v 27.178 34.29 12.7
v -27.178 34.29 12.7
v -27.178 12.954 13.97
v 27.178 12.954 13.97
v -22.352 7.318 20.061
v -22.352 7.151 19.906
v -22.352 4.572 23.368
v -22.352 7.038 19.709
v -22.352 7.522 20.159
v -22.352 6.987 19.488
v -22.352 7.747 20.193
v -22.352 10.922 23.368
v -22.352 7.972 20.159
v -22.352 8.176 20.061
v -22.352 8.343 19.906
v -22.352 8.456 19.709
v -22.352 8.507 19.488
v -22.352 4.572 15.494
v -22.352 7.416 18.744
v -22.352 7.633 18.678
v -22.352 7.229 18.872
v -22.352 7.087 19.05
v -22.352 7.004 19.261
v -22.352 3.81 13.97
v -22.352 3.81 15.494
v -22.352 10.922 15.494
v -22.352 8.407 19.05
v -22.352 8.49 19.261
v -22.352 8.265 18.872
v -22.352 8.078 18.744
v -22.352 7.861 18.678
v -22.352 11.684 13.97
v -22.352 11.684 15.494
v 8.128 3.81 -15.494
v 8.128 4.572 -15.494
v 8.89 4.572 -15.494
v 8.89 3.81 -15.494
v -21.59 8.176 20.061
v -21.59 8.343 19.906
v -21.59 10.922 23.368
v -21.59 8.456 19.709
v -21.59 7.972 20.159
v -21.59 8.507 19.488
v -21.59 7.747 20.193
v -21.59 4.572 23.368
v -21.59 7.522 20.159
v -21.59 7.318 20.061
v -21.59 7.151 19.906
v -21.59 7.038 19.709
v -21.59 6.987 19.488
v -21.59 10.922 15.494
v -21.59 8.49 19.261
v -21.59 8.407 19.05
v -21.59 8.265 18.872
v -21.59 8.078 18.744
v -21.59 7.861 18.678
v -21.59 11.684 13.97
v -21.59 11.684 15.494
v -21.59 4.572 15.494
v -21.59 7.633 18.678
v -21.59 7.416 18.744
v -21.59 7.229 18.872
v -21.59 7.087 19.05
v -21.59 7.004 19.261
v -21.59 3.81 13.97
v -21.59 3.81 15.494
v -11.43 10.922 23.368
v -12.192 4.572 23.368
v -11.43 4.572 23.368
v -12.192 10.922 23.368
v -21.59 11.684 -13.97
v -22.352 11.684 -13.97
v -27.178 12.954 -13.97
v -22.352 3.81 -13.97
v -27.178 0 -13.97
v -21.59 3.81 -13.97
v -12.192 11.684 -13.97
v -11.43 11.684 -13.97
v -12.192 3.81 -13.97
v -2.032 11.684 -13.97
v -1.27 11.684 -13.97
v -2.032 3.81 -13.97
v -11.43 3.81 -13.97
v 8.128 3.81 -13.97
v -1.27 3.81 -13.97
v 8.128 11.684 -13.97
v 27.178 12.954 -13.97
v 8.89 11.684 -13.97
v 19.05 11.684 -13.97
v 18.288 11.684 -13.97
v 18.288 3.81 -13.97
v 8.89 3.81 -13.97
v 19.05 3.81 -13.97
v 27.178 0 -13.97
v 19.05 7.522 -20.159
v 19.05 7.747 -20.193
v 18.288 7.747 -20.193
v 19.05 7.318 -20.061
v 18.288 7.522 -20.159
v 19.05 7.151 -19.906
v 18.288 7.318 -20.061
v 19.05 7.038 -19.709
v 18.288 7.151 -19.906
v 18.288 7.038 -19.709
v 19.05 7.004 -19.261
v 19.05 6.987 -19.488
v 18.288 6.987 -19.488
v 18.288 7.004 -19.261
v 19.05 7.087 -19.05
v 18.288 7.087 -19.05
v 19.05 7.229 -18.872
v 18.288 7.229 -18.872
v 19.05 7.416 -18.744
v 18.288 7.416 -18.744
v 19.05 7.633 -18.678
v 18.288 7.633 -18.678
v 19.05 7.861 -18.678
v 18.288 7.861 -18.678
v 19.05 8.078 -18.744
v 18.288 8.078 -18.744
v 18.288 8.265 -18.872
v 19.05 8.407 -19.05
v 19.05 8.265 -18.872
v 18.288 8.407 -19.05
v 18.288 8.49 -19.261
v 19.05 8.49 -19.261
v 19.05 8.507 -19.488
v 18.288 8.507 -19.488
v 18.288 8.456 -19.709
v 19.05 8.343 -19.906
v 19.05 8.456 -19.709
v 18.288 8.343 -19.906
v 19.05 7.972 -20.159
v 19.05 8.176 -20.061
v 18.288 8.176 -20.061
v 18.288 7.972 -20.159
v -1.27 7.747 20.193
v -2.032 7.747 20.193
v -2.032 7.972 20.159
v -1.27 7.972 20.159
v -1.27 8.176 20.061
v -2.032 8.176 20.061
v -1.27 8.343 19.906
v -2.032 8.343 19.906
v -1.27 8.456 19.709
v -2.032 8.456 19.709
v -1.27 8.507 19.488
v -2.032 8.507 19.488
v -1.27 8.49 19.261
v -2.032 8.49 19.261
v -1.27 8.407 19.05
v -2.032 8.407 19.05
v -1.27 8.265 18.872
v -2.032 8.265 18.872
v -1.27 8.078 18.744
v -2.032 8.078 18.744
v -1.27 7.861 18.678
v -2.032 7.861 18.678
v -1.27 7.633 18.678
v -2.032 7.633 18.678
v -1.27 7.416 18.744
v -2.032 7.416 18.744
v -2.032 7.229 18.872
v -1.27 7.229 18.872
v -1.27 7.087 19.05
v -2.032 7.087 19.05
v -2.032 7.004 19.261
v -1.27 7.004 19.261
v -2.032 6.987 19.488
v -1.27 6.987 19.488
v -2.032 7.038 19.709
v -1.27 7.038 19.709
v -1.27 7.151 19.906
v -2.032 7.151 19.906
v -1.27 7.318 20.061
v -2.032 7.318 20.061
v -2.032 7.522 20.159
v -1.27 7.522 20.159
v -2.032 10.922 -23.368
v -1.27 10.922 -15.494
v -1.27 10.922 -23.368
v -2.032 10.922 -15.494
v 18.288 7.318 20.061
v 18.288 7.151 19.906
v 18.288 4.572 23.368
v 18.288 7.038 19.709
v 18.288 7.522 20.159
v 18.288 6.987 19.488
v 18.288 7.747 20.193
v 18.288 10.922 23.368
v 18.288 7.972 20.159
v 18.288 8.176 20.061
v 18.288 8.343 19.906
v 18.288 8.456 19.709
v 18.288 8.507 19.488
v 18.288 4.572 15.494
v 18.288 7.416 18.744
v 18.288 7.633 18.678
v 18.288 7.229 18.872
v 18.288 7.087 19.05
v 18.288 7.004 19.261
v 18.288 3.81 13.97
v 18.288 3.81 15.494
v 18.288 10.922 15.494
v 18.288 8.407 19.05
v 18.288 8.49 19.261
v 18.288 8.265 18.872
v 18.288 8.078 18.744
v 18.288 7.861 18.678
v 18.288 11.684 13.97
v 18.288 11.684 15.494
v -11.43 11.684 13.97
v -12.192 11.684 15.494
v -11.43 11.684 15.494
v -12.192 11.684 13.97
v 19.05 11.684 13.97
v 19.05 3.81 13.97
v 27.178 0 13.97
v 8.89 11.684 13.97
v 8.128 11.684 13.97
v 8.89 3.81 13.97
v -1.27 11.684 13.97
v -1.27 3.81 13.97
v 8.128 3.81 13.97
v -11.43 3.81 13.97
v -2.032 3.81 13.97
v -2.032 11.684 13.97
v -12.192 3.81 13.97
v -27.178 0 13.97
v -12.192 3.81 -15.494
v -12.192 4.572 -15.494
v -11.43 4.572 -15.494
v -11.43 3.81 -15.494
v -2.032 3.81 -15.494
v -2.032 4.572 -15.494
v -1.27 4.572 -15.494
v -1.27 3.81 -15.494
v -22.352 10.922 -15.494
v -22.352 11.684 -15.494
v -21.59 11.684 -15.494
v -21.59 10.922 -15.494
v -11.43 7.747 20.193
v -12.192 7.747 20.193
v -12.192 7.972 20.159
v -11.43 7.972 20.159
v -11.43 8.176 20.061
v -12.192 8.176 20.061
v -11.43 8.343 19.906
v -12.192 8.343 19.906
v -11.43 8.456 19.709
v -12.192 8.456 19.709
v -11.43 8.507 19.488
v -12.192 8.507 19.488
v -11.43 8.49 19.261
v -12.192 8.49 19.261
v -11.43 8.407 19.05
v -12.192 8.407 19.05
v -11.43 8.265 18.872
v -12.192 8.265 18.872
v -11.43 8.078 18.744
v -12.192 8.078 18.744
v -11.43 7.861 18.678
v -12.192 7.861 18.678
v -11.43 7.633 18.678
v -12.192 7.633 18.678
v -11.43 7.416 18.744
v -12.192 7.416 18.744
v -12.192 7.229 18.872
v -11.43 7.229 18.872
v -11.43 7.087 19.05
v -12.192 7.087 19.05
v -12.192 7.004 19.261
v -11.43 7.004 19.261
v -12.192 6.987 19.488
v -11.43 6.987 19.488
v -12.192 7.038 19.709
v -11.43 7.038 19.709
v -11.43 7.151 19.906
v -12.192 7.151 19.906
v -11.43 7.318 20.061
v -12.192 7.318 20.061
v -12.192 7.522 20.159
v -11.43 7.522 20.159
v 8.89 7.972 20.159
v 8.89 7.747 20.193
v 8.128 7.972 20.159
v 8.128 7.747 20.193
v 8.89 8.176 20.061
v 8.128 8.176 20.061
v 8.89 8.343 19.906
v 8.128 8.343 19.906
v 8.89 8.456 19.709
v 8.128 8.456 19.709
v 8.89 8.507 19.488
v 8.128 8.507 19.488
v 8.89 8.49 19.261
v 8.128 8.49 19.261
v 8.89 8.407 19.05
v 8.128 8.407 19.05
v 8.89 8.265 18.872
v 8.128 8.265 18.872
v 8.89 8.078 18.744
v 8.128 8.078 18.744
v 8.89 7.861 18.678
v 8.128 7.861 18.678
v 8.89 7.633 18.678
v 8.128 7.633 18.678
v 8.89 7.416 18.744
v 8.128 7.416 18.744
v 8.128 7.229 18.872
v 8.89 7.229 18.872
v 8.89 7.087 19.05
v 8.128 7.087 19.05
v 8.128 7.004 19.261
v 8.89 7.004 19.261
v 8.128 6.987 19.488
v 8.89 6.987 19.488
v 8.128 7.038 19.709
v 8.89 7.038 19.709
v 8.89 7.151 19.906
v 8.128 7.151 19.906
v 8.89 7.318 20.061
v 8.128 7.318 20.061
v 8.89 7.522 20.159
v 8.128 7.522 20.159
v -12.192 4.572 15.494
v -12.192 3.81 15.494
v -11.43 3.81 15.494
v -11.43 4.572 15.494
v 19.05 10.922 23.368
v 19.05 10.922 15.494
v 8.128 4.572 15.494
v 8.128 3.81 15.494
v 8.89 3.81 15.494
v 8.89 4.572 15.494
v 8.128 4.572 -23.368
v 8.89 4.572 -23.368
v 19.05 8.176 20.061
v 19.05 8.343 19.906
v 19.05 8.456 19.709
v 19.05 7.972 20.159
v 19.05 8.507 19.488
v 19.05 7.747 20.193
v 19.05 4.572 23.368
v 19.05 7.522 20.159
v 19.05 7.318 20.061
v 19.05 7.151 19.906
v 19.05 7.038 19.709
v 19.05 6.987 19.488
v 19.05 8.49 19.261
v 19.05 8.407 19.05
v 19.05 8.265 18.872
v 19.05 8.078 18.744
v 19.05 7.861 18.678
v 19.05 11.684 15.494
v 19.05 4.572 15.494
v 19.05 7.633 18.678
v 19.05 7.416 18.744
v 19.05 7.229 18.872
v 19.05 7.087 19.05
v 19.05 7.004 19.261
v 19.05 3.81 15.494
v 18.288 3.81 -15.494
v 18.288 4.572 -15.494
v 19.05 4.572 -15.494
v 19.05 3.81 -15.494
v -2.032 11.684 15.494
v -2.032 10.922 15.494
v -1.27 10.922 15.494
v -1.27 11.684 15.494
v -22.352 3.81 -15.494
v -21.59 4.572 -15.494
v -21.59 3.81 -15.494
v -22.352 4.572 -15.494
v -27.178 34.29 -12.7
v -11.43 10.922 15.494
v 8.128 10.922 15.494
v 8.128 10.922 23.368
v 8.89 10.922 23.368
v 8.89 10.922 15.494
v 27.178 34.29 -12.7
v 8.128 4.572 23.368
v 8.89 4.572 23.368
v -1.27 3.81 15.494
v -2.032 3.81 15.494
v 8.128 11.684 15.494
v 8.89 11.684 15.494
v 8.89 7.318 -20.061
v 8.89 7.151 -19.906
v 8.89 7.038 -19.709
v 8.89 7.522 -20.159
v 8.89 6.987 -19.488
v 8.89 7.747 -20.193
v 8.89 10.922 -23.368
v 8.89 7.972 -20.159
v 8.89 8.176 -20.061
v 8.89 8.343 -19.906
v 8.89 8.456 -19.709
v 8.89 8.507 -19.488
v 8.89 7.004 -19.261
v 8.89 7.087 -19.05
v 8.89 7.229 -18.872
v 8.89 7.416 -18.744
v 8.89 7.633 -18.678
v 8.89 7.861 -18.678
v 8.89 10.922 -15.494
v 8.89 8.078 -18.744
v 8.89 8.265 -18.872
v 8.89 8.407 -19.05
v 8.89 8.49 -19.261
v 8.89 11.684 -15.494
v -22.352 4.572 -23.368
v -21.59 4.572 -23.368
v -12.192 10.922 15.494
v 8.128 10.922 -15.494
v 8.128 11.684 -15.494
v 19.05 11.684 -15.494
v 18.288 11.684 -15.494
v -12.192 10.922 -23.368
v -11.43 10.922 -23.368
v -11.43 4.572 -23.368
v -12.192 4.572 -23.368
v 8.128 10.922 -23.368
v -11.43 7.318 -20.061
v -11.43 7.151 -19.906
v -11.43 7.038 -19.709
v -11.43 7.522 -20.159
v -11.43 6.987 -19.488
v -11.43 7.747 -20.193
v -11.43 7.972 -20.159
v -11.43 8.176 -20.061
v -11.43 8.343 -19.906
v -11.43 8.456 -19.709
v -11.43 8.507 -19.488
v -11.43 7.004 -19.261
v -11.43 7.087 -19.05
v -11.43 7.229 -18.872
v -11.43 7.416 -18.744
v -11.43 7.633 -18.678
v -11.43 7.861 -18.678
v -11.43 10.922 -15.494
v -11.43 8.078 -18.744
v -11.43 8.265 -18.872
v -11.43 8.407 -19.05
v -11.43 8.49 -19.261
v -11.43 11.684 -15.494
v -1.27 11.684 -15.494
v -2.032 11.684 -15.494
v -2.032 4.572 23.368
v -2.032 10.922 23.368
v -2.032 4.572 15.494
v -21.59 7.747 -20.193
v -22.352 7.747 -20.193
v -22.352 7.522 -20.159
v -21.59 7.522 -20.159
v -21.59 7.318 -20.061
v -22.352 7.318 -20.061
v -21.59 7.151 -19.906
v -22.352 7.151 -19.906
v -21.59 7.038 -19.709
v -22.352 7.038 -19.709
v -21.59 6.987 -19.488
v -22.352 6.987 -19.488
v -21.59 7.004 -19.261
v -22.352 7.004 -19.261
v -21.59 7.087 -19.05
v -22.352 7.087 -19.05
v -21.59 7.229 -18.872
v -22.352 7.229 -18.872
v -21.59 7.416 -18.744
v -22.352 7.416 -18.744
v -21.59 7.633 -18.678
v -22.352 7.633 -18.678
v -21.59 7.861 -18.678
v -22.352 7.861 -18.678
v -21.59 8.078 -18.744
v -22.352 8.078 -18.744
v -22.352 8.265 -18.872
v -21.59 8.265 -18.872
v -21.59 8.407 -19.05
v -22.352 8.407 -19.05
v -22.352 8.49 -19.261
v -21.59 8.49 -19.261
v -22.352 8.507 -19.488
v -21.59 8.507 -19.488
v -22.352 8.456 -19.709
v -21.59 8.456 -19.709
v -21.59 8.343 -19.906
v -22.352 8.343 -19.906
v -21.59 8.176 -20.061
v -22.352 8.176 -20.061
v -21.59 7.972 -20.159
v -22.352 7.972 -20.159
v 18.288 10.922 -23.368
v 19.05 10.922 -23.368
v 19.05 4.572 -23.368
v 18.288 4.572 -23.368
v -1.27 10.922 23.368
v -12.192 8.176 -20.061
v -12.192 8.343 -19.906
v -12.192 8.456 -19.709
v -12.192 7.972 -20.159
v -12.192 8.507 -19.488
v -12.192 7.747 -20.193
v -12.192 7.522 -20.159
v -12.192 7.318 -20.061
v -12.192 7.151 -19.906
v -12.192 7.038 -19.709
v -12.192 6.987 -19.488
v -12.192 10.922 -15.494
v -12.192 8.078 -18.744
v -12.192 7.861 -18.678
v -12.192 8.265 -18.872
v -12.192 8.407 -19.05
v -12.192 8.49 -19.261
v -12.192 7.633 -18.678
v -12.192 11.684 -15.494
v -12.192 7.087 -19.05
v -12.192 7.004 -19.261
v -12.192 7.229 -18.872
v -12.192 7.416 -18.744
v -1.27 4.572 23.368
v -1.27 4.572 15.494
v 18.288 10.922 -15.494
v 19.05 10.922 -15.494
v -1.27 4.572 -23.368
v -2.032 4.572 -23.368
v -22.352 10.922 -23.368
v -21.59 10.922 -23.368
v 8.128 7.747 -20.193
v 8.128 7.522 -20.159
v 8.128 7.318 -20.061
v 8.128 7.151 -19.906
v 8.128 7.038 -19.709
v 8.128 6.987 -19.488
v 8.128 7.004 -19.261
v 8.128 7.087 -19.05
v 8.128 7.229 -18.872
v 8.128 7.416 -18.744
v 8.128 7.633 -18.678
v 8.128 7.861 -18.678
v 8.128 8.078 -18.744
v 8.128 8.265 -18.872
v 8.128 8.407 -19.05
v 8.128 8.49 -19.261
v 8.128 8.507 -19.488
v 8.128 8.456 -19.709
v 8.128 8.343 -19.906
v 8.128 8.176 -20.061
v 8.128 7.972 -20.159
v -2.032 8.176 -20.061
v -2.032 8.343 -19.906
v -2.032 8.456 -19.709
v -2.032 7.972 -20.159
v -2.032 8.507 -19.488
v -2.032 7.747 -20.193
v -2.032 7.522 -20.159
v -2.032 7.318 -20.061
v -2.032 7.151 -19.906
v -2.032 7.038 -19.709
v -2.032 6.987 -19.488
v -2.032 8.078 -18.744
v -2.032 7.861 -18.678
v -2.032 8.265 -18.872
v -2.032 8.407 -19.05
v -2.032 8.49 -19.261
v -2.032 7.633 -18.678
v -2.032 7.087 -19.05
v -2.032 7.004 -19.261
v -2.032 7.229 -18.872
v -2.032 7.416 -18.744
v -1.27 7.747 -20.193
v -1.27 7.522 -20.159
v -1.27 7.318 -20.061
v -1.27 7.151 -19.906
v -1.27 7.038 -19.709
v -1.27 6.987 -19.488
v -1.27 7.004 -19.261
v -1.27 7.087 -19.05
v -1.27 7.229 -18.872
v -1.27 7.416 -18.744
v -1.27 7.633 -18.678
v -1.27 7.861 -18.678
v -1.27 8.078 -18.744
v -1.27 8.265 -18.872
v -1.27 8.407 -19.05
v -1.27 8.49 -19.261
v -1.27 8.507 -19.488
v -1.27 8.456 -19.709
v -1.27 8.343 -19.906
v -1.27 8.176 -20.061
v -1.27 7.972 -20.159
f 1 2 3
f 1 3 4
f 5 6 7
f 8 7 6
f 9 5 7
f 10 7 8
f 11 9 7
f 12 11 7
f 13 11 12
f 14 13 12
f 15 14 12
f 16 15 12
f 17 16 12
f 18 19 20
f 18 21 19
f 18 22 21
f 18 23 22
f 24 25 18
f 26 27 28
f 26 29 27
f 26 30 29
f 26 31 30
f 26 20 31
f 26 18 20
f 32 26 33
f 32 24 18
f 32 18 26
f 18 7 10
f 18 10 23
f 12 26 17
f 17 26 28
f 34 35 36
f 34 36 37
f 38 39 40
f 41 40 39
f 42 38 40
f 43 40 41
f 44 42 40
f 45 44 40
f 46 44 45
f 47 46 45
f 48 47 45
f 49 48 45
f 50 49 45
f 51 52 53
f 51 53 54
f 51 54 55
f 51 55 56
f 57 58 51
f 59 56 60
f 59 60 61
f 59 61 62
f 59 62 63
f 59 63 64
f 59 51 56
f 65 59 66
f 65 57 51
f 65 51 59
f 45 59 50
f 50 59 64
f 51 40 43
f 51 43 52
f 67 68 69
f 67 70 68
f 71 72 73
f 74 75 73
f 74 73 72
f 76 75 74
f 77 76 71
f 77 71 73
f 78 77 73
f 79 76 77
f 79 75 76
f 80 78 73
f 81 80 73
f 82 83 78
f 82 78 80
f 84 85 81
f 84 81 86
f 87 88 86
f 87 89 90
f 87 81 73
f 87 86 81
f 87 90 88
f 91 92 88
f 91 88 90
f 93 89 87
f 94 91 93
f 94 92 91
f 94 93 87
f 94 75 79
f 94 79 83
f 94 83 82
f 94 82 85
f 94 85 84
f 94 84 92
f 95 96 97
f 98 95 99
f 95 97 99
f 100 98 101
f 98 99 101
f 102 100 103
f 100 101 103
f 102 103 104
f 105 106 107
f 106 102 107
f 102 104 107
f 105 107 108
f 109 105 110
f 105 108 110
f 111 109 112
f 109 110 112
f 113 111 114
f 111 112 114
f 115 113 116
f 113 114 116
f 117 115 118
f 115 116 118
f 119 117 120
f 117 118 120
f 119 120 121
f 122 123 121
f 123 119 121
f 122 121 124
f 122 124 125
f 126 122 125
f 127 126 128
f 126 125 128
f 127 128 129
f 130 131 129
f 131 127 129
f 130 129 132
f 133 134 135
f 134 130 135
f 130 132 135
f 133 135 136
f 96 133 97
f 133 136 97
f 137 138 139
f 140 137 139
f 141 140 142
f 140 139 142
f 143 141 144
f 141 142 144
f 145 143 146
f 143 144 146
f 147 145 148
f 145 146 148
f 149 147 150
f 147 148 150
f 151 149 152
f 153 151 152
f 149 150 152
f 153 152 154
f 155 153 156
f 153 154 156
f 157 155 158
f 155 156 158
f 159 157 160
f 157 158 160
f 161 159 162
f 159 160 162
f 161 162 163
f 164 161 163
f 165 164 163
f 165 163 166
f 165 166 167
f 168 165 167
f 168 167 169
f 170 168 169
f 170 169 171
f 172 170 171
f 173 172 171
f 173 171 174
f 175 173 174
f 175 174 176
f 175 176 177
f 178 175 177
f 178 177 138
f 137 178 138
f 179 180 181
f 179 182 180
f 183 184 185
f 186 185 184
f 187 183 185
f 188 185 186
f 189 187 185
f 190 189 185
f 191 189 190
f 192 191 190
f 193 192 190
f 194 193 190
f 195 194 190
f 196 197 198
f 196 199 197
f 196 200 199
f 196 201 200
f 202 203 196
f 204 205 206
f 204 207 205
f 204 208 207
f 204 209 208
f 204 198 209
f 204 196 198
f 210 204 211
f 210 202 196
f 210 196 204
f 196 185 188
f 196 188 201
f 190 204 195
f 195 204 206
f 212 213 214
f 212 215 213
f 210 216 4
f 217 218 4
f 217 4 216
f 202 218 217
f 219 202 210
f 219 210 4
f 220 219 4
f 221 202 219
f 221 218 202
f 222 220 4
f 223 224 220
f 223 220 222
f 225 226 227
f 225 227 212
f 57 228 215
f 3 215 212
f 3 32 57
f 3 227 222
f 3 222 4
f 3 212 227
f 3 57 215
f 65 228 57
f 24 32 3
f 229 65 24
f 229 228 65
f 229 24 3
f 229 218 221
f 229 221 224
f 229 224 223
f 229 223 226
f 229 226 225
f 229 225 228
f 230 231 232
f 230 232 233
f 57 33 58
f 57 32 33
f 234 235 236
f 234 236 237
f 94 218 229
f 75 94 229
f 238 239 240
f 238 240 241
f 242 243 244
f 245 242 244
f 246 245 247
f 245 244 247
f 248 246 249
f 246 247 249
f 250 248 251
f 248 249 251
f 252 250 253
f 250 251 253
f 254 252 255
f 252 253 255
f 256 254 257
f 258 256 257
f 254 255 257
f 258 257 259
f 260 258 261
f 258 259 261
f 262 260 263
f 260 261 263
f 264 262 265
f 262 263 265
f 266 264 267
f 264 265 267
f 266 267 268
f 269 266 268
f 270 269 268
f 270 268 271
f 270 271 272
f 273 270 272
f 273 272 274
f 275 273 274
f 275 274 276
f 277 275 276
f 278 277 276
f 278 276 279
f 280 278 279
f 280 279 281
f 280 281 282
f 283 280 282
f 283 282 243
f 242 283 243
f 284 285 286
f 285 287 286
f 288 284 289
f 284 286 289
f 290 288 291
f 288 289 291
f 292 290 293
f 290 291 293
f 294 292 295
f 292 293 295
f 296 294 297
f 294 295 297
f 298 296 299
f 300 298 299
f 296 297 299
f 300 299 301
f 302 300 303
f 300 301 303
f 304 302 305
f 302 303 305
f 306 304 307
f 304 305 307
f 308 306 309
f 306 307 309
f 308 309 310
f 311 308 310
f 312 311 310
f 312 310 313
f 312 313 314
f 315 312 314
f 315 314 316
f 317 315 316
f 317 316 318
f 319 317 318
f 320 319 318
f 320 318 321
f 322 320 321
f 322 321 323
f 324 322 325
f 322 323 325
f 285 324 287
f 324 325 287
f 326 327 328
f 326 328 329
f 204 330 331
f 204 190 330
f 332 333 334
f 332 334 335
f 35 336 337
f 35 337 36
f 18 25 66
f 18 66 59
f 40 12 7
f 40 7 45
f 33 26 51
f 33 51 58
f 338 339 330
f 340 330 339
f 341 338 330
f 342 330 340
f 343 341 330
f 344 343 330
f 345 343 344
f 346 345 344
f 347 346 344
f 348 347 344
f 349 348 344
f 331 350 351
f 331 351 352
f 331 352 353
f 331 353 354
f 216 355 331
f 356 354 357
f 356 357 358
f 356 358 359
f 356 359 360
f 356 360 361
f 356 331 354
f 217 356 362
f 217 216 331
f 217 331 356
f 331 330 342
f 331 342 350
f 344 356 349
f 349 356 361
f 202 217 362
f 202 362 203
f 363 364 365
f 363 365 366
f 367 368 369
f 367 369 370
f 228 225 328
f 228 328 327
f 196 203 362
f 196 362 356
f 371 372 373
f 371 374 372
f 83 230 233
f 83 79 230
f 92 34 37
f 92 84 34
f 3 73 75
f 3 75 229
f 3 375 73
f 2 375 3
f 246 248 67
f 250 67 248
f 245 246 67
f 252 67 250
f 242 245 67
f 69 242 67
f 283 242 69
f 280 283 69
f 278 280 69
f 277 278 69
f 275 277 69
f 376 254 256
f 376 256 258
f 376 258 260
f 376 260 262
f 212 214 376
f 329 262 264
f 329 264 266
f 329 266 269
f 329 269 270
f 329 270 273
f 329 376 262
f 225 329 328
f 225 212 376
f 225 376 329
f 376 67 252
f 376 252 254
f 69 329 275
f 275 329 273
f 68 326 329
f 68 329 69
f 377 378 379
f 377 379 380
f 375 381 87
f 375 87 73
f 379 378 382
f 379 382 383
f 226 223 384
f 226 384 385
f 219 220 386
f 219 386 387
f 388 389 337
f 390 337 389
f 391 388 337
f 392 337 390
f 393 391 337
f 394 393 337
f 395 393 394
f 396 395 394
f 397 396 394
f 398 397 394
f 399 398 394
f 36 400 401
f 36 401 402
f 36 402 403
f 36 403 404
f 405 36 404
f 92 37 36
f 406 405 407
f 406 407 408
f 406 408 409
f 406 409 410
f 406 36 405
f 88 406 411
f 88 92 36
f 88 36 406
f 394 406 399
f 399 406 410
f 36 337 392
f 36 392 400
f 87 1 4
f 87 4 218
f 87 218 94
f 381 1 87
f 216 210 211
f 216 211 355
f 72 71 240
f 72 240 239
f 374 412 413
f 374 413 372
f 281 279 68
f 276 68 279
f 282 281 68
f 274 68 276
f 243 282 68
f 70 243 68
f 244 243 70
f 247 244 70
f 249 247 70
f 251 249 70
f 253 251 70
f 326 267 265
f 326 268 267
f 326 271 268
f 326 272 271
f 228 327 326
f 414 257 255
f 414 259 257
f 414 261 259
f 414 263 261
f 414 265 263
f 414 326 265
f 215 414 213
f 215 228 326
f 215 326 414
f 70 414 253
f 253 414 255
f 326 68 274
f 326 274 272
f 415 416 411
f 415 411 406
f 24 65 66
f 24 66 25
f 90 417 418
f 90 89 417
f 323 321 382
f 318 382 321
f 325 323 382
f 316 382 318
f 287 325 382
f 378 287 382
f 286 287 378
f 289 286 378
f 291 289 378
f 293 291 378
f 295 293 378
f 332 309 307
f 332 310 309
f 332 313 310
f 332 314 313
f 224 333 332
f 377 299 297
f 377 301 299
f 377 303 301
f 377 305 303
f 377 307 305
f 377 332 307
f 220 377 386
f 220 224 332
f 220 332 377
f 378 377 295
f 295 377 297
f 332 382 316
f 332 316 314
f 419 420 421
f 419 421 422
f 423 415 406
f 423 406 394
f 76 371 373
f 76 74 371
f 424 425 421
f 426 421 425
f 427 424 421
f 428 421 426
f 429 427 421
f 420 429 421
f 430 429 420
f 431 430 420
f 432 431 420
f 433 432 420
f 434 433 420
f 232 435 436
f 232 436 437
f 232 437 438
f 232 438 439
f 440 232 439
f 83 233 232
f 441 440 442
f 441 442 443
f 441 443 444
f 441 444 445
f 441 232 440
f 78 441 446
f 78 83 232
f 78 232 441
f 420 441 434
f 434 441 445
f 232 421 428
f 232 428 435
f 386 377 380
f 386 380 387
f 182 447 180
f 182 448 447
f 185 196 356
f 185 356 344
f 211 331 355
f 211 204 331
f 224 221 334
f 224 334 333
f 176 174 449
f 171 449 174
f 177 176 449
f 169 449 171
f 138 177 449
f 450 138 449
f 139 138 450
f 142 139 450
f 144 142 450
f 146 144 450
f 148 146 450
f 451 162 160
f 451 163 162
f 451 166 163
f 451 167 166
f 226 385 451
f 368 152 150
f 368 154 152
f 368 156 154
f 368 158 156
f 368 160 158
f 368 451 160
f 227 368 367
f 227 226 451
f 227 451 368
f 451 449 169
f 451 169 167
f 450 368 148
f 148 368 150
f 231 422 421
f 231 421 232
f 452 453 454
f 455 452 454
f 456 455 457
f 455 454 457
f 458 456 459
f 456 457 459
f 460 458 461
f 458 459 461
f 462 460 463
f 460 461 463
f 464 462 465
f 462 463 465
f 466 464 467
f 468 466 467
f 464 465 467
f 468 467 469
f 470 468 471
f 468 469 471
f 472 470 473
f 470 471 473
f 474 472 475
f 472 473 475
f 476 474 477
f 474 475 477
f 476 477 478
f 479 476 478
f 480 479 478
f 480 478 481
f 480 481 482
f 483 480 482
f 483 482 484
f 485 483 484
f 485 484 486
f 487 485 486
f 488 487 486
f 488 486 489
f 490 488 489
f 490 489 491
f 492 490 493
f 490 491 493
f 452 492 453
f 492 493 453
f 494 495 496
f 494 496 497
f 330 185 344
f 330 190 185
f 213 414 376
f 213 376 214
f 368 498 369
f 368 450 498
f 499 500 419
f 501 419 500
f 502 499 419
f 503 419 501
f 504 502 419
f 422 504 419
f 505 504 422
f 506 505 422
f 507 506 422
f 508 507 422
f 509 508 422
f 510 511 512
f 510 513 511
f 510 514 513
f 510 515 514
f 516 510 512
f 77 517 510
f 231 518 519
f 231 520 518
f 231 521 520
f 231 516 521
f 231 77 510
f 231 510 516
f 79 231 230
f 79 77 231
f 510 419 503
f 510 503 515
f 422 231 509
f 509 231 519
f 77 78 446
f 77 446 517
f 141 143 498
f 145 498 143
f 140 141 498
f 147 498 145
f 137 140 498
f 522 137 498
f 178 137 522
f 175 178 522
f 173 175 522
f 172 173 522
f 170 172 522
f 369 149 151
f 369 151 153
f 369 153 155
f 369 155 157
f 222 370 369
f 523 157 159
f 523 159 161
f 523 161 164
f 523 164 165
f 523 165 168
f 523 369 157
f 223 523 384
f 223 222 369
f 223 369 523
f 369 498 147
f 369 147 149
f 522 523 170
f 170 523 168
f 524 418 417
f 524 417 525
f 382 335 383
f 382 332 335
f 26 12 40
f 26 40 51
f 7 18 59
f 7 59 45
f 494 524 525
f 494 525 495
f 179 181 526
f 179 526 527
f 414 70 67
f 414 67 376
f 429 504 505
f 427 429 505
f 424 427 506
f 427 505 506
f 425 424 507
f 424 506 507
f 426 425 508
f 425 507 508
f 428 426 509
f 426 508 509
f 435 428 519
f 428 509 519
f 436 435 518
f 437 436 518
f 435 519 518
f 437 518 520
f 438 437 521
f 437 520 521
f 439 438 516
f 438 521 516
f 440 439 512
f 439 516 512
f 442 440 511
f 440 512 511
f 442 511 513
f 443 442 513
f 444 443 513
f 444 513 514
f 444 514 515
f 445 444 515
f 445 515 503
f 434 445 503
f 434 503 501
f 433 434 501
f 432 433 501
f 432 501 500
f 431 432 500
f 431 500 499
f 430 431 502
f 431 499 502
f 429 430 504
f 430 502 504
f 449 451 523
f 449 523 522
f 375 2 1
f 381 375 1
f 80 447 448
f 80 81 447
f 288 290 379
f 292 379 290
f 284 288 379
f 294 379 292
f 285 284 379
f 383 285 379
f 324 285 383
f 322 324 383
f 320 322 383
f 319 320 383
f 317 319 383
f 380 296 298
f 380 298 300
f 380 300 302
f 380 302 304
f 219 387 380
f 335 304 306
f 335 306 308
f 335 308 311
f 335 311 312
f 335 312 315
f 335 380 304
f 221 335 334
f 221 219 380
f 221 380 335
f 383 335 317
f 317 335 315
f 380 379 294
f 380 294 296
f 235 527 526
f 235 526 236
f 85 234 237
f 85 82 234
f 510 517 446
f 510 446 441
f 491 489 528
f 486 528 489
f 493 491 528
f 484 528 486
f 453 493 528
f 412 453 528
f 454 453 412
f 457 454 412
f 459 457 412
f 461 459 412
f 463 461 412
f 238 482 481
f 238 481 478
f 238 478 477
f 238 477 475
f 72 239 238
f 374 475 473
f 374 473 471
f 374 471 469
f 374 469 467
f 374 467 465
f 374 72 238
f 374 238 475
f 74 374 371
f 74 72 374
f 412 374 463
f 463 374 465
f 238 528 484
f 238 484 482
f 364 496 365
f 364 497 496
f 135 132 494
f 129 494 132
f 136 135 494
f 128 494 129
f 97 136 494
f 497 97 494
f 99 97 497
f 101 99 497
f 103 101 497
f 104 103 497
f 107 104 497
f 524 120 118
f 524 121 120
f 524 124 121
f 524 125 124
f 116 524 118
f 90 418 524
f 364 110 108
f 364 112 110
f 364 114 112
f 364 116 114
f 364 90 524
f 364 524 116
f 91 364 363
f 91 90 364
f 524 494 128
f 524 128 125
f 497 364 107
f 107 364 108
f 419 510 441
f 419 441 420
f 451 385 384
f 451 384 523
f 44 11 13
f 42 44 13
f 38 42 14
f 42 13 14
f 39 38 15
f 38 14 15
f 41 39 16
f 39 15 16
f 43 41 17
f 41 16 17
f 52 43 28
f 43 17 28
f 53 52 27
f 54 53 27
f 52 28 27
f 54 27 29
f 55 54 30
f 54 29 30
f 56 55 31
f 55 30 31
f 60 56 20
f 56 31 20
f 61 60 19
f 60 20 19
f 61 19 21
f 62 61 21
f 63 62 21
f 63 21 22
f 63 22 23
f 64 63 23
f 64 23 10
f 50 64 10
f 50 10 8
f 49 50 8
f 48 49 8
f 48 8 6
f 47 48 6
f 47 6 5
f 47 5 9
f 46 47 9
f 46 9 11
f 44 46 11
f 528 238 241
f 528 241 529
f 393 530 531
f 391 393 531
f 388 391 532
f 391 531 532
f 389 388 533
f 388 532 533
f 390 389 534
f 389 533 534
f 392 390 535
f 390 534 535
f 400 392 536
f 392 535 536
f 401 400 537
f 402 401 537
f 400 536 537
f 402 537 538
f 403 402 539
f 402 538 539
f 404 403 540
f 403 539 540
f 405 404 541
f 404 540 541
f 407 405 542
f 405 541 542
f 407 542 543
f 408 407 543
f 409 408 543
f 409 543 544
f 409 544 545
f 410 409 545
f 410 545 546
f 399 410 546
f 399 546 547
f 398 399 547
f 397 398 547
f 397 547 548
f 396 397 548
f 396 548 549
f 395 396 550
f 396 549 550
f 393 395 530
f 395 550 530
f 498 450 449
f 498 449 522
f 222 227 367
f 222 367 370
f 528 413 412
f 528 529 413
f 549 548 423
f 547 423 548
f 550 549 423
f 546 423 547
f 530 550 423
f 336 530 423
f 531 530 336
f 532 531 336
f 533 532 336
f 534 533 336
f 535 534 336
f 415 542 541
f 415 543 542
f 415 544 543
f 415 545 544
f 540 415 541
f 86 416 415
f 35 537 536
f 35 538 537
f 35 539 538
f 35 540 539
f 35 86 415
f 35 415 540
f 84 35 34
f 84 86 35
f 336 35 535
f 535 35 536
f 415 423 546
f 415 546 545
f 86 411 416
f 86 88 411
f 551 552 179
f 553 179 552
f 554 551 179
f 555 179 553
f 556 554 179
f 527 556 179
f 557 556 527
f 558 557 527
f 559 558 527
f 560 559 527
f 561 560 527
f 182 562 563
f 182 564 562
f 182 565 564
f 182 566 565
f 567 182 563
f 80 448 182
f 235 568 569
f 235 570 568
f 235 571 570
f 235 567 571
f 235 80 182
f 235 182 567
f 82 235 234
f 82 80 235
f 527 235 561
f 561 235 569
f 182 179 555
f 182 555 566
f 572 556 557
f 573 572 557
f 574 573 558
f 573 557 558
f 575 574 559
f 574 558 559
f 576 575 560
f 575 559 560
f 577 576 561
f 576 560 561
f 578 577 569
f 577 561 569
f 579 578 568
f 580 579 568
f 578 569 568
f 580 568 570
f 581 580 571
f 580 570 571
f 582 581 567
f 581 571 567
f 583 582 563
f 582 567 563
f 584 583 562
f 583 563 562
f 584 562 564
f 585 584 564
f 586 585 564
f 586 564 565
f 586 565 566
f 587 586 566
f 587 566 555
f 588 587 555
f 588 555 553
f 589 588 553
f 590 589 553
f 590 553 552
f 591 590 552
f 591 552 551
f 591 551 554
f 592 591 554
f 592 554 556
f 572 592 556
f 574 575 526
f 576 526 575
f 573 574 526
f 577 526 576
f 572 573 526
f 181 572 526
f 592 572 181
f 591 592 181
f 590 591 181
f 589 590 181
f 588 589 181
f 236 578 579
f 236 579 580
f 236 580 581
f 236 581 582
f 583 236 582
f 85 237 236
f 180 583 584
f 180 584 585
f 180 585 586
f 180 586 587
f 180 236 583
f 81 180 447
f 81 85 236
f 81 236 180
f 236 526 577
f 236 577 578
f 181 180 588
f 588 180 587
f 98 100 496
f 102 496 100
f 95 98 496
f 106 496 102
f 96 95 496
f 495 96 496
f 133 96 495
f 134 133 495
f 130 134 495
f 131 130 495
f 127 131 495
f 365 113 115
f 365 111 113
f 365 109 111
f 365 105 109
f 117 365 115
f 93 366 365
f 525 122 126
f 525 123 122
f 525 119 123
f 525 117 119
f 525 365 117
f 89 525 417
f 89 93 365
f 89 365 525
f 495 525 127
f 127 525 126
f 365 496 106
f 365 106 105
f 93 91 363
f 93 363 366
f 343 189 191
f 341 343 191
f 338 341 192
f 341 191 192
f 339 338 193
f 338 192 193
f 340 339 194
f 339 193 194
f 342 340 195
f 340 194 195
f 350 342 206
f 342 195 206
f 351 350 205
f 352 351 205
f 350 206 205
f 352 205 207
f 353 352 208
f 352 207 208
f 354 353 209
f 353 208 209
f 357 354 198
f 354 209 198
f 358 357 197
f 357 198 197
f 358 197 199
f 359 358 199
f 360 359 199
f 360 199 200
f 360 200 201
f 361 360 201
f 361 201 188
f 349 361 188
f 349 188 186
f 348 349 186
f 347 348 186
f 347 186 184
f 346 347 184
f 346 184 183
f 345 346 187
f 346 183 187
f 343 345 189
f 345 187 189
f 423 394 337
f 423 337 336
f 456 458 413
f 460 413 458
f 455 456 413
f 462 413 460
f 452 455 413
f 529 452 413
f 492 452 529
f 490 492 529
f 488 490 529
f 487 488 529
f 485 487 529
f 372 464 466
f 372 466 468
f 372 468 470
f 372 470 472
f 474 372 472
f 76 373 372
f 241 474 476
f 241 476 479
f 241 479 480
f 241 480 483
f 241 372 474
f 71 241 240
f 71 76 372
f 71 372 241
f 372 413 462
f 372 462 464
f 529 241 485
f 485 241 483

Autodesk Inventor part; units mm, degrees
ref_plane "YZ Plane" through (0, 0, 0) normal (1, 0, 0) x (0, 1, 0)
ref_plane "XZ Plane" through (0, 0, 0) normal (0, 1, 0) x (-1, 0, 0)
sketch "Sketch2" plane through (0, 0, 0) normal (0, 1, 0) x (-1, 0, 0)
  line L0 (-27.178, 13.97) -> (27.178, 13.97)
  line L1 (27.178, 13.97) -> (27.178, -13.97)
  line L2 (27.178, -13.97) -> (-27.178, -13.97)
  line L3 (-27.178, -13.97) -> (-27.178, 13.97)
  line L4 (-27.178, 13.97) -> (27.178, -13.97) construction
  point P0 (0, 0)
  point P1 (0, 0)
  dimension "d0" = 54.356
  dimension "d1" = 27.94
extrude "Extrusion1" add sketch "Sketch2" along normal blind 12.954
sketch "Sketch3" plane through (-27.178, 0, 13.97) normal (0, 0, 1) x (1, 0, 0)
  line L0 (54.356, 12.954) -> (0, 12.954) projected
  line L1 (0, 0) -> (0, 12.954) projected
  line L2 (54.356, 0) -> (0, 0) projected
  line L3 (4.826, 11.684) -> (5.588, 11.684)
  line L4 (5.588, 11.684) -> (5.588, 3.81)
  line L5 (5.588, 3.81) -> (4.826, 3.81)
  line L6 (4.826, 3.81) -> (4.826, 11.684)
  line L7 (14.986, 11.684) -> (15.748, 11.684)
  line L8 (15.748, 11.684) -> (15.748, 3.81)
  line L9 (15.748, 3.81) -> (14.986, 3.81)
  line L10 (14.986, 3.81) -> (14.986, 11.684)
  line L11 (25.146, 11.684) -> (25.908, 11.684)
  line L12 (25.908, 11.684) -> (25.908, 3.81)
  line L13 (25.908, 3.81) -> (25.146, 3.81)
  line L14 (25.146, 3.81) -> (25.146, 11.684)
  line L15 (35.306, 11.684) -> (36.068, 11.684)
  line L16 (36.068, 11.684) -> (36.068, 3.81)
  line L17 (36.068, 3.81) -> (35.306, 3.81)
  line L18 (35.306, 3.81) -> (35.306, 11.684)
  line L19 (45.466, 11.684) -> (46.228, 11.684)
  line L20 (46.228, 11.684) -> (46.228, 3.81)
  line L21 (46.228, 3.81) -> (45.466, 3.81)
  line L22 (45.466, 3.81) -> (45.466, 11.684)
  point P0 (27.178, 0)
  dimension "d4" = 0.762
  dimension "d5" = 7.874
  dimension "d6" = 1.27
  dimension "d7" = 4.826
  dimension "d10" = 10.16
extrude "Extrusion2" add sketch "Sketch3" along normal blind 9.398
sketch "Sketch4" plane through (-22.352, 3.81, 13.97) normal (-1, 0, 0) x (0, 0, 1)
  line L0 (0, 0) -> (0, 7.874) projected
  line L1 (1.524, 7.874) -> (9.398, 7.874)
  line L2 (9.398, 7.874) -> (9.398, 7.112)
  line L3 (9.398, 7.112) -> (1.524, 7.112)
  line L4 (1.524, 7.112) -> (1.524, 7.874)
  line L5 (9.398, 0) -> (1.524, 0)
  line L6 (1.524, 0) -> (1.524, 0.762)
  line L7 (1.524, 0.762) -> (9.398, 0.762)
  line L8 (9.398, 0.762) -> (9.398, 0)
  circle A0 centre (5.461, 3.937) radius 0.762
  line L9 (9.398, 7.112) -> (1.524, 0.762) construction
  point P0 (-13.97, -3.81)
  dimension "d17" = 6.35
  dimension "d18" = 1.524
  dimension "d19" = 1.524
extrude "Extrusion3" cut sketch "Sketch4" against normal up to surface (41.402 mm away)
mirror "Mirror1" about plane through (0, 0, 0) normal (0, 0, 1) of "Extrusion2", "Extrusion3"
sketch "Sketch5" plane through (0, 12.954, 0) normal (0, 1, 0) x (1, 0, 0)
  line L0 (-27.178, -13.97) -> (-27.178, 13.97) projected
  line L1 (27.178, -13.97) -> (-27.178, -13.97) projected
  line L2 (-27.178, 13.97) -> (27.178, 13.97)
  line L3 (27.178, 13.97) -> (27.178, -13.97)
  line L4 (27.178, -13.97) -> (-27.178, -13.97)
  line L5 (-27.178, -13.97) -> (-27.178, 13.97)
  point P0 (0, 0)
ref_plane "Work Plane1" through (0, 34.29, 0) normal (0, 1, 0) x (1, 0, 0)
sketch "Sketch6" plane through (0, 34.29, 0) normal (0, 1, 0) x (1, 0, 0)
  line L0 (-27.178, 12.7) -> (27.178, 12.7)
  line L1 (27.178, 12.7) -> (27.178, -12.7)
  line L2 (27.178, -12.7) -> (-27.178, -12.7)
  line L3 (-27.178, -12.7) -> (-27.178, 12.7)
  line L4 (27.178, 12.7) -> (-27.178, -12.7) construction
  point P0 (0, 0)
  point P1 (0, 0)
  point P2 (-27.178, 13.97)
  dimension "d23" = 25.4
loft "Loft1" add profiles "Sketch5", "Sketch6"
properties part number "FuseBlock"
